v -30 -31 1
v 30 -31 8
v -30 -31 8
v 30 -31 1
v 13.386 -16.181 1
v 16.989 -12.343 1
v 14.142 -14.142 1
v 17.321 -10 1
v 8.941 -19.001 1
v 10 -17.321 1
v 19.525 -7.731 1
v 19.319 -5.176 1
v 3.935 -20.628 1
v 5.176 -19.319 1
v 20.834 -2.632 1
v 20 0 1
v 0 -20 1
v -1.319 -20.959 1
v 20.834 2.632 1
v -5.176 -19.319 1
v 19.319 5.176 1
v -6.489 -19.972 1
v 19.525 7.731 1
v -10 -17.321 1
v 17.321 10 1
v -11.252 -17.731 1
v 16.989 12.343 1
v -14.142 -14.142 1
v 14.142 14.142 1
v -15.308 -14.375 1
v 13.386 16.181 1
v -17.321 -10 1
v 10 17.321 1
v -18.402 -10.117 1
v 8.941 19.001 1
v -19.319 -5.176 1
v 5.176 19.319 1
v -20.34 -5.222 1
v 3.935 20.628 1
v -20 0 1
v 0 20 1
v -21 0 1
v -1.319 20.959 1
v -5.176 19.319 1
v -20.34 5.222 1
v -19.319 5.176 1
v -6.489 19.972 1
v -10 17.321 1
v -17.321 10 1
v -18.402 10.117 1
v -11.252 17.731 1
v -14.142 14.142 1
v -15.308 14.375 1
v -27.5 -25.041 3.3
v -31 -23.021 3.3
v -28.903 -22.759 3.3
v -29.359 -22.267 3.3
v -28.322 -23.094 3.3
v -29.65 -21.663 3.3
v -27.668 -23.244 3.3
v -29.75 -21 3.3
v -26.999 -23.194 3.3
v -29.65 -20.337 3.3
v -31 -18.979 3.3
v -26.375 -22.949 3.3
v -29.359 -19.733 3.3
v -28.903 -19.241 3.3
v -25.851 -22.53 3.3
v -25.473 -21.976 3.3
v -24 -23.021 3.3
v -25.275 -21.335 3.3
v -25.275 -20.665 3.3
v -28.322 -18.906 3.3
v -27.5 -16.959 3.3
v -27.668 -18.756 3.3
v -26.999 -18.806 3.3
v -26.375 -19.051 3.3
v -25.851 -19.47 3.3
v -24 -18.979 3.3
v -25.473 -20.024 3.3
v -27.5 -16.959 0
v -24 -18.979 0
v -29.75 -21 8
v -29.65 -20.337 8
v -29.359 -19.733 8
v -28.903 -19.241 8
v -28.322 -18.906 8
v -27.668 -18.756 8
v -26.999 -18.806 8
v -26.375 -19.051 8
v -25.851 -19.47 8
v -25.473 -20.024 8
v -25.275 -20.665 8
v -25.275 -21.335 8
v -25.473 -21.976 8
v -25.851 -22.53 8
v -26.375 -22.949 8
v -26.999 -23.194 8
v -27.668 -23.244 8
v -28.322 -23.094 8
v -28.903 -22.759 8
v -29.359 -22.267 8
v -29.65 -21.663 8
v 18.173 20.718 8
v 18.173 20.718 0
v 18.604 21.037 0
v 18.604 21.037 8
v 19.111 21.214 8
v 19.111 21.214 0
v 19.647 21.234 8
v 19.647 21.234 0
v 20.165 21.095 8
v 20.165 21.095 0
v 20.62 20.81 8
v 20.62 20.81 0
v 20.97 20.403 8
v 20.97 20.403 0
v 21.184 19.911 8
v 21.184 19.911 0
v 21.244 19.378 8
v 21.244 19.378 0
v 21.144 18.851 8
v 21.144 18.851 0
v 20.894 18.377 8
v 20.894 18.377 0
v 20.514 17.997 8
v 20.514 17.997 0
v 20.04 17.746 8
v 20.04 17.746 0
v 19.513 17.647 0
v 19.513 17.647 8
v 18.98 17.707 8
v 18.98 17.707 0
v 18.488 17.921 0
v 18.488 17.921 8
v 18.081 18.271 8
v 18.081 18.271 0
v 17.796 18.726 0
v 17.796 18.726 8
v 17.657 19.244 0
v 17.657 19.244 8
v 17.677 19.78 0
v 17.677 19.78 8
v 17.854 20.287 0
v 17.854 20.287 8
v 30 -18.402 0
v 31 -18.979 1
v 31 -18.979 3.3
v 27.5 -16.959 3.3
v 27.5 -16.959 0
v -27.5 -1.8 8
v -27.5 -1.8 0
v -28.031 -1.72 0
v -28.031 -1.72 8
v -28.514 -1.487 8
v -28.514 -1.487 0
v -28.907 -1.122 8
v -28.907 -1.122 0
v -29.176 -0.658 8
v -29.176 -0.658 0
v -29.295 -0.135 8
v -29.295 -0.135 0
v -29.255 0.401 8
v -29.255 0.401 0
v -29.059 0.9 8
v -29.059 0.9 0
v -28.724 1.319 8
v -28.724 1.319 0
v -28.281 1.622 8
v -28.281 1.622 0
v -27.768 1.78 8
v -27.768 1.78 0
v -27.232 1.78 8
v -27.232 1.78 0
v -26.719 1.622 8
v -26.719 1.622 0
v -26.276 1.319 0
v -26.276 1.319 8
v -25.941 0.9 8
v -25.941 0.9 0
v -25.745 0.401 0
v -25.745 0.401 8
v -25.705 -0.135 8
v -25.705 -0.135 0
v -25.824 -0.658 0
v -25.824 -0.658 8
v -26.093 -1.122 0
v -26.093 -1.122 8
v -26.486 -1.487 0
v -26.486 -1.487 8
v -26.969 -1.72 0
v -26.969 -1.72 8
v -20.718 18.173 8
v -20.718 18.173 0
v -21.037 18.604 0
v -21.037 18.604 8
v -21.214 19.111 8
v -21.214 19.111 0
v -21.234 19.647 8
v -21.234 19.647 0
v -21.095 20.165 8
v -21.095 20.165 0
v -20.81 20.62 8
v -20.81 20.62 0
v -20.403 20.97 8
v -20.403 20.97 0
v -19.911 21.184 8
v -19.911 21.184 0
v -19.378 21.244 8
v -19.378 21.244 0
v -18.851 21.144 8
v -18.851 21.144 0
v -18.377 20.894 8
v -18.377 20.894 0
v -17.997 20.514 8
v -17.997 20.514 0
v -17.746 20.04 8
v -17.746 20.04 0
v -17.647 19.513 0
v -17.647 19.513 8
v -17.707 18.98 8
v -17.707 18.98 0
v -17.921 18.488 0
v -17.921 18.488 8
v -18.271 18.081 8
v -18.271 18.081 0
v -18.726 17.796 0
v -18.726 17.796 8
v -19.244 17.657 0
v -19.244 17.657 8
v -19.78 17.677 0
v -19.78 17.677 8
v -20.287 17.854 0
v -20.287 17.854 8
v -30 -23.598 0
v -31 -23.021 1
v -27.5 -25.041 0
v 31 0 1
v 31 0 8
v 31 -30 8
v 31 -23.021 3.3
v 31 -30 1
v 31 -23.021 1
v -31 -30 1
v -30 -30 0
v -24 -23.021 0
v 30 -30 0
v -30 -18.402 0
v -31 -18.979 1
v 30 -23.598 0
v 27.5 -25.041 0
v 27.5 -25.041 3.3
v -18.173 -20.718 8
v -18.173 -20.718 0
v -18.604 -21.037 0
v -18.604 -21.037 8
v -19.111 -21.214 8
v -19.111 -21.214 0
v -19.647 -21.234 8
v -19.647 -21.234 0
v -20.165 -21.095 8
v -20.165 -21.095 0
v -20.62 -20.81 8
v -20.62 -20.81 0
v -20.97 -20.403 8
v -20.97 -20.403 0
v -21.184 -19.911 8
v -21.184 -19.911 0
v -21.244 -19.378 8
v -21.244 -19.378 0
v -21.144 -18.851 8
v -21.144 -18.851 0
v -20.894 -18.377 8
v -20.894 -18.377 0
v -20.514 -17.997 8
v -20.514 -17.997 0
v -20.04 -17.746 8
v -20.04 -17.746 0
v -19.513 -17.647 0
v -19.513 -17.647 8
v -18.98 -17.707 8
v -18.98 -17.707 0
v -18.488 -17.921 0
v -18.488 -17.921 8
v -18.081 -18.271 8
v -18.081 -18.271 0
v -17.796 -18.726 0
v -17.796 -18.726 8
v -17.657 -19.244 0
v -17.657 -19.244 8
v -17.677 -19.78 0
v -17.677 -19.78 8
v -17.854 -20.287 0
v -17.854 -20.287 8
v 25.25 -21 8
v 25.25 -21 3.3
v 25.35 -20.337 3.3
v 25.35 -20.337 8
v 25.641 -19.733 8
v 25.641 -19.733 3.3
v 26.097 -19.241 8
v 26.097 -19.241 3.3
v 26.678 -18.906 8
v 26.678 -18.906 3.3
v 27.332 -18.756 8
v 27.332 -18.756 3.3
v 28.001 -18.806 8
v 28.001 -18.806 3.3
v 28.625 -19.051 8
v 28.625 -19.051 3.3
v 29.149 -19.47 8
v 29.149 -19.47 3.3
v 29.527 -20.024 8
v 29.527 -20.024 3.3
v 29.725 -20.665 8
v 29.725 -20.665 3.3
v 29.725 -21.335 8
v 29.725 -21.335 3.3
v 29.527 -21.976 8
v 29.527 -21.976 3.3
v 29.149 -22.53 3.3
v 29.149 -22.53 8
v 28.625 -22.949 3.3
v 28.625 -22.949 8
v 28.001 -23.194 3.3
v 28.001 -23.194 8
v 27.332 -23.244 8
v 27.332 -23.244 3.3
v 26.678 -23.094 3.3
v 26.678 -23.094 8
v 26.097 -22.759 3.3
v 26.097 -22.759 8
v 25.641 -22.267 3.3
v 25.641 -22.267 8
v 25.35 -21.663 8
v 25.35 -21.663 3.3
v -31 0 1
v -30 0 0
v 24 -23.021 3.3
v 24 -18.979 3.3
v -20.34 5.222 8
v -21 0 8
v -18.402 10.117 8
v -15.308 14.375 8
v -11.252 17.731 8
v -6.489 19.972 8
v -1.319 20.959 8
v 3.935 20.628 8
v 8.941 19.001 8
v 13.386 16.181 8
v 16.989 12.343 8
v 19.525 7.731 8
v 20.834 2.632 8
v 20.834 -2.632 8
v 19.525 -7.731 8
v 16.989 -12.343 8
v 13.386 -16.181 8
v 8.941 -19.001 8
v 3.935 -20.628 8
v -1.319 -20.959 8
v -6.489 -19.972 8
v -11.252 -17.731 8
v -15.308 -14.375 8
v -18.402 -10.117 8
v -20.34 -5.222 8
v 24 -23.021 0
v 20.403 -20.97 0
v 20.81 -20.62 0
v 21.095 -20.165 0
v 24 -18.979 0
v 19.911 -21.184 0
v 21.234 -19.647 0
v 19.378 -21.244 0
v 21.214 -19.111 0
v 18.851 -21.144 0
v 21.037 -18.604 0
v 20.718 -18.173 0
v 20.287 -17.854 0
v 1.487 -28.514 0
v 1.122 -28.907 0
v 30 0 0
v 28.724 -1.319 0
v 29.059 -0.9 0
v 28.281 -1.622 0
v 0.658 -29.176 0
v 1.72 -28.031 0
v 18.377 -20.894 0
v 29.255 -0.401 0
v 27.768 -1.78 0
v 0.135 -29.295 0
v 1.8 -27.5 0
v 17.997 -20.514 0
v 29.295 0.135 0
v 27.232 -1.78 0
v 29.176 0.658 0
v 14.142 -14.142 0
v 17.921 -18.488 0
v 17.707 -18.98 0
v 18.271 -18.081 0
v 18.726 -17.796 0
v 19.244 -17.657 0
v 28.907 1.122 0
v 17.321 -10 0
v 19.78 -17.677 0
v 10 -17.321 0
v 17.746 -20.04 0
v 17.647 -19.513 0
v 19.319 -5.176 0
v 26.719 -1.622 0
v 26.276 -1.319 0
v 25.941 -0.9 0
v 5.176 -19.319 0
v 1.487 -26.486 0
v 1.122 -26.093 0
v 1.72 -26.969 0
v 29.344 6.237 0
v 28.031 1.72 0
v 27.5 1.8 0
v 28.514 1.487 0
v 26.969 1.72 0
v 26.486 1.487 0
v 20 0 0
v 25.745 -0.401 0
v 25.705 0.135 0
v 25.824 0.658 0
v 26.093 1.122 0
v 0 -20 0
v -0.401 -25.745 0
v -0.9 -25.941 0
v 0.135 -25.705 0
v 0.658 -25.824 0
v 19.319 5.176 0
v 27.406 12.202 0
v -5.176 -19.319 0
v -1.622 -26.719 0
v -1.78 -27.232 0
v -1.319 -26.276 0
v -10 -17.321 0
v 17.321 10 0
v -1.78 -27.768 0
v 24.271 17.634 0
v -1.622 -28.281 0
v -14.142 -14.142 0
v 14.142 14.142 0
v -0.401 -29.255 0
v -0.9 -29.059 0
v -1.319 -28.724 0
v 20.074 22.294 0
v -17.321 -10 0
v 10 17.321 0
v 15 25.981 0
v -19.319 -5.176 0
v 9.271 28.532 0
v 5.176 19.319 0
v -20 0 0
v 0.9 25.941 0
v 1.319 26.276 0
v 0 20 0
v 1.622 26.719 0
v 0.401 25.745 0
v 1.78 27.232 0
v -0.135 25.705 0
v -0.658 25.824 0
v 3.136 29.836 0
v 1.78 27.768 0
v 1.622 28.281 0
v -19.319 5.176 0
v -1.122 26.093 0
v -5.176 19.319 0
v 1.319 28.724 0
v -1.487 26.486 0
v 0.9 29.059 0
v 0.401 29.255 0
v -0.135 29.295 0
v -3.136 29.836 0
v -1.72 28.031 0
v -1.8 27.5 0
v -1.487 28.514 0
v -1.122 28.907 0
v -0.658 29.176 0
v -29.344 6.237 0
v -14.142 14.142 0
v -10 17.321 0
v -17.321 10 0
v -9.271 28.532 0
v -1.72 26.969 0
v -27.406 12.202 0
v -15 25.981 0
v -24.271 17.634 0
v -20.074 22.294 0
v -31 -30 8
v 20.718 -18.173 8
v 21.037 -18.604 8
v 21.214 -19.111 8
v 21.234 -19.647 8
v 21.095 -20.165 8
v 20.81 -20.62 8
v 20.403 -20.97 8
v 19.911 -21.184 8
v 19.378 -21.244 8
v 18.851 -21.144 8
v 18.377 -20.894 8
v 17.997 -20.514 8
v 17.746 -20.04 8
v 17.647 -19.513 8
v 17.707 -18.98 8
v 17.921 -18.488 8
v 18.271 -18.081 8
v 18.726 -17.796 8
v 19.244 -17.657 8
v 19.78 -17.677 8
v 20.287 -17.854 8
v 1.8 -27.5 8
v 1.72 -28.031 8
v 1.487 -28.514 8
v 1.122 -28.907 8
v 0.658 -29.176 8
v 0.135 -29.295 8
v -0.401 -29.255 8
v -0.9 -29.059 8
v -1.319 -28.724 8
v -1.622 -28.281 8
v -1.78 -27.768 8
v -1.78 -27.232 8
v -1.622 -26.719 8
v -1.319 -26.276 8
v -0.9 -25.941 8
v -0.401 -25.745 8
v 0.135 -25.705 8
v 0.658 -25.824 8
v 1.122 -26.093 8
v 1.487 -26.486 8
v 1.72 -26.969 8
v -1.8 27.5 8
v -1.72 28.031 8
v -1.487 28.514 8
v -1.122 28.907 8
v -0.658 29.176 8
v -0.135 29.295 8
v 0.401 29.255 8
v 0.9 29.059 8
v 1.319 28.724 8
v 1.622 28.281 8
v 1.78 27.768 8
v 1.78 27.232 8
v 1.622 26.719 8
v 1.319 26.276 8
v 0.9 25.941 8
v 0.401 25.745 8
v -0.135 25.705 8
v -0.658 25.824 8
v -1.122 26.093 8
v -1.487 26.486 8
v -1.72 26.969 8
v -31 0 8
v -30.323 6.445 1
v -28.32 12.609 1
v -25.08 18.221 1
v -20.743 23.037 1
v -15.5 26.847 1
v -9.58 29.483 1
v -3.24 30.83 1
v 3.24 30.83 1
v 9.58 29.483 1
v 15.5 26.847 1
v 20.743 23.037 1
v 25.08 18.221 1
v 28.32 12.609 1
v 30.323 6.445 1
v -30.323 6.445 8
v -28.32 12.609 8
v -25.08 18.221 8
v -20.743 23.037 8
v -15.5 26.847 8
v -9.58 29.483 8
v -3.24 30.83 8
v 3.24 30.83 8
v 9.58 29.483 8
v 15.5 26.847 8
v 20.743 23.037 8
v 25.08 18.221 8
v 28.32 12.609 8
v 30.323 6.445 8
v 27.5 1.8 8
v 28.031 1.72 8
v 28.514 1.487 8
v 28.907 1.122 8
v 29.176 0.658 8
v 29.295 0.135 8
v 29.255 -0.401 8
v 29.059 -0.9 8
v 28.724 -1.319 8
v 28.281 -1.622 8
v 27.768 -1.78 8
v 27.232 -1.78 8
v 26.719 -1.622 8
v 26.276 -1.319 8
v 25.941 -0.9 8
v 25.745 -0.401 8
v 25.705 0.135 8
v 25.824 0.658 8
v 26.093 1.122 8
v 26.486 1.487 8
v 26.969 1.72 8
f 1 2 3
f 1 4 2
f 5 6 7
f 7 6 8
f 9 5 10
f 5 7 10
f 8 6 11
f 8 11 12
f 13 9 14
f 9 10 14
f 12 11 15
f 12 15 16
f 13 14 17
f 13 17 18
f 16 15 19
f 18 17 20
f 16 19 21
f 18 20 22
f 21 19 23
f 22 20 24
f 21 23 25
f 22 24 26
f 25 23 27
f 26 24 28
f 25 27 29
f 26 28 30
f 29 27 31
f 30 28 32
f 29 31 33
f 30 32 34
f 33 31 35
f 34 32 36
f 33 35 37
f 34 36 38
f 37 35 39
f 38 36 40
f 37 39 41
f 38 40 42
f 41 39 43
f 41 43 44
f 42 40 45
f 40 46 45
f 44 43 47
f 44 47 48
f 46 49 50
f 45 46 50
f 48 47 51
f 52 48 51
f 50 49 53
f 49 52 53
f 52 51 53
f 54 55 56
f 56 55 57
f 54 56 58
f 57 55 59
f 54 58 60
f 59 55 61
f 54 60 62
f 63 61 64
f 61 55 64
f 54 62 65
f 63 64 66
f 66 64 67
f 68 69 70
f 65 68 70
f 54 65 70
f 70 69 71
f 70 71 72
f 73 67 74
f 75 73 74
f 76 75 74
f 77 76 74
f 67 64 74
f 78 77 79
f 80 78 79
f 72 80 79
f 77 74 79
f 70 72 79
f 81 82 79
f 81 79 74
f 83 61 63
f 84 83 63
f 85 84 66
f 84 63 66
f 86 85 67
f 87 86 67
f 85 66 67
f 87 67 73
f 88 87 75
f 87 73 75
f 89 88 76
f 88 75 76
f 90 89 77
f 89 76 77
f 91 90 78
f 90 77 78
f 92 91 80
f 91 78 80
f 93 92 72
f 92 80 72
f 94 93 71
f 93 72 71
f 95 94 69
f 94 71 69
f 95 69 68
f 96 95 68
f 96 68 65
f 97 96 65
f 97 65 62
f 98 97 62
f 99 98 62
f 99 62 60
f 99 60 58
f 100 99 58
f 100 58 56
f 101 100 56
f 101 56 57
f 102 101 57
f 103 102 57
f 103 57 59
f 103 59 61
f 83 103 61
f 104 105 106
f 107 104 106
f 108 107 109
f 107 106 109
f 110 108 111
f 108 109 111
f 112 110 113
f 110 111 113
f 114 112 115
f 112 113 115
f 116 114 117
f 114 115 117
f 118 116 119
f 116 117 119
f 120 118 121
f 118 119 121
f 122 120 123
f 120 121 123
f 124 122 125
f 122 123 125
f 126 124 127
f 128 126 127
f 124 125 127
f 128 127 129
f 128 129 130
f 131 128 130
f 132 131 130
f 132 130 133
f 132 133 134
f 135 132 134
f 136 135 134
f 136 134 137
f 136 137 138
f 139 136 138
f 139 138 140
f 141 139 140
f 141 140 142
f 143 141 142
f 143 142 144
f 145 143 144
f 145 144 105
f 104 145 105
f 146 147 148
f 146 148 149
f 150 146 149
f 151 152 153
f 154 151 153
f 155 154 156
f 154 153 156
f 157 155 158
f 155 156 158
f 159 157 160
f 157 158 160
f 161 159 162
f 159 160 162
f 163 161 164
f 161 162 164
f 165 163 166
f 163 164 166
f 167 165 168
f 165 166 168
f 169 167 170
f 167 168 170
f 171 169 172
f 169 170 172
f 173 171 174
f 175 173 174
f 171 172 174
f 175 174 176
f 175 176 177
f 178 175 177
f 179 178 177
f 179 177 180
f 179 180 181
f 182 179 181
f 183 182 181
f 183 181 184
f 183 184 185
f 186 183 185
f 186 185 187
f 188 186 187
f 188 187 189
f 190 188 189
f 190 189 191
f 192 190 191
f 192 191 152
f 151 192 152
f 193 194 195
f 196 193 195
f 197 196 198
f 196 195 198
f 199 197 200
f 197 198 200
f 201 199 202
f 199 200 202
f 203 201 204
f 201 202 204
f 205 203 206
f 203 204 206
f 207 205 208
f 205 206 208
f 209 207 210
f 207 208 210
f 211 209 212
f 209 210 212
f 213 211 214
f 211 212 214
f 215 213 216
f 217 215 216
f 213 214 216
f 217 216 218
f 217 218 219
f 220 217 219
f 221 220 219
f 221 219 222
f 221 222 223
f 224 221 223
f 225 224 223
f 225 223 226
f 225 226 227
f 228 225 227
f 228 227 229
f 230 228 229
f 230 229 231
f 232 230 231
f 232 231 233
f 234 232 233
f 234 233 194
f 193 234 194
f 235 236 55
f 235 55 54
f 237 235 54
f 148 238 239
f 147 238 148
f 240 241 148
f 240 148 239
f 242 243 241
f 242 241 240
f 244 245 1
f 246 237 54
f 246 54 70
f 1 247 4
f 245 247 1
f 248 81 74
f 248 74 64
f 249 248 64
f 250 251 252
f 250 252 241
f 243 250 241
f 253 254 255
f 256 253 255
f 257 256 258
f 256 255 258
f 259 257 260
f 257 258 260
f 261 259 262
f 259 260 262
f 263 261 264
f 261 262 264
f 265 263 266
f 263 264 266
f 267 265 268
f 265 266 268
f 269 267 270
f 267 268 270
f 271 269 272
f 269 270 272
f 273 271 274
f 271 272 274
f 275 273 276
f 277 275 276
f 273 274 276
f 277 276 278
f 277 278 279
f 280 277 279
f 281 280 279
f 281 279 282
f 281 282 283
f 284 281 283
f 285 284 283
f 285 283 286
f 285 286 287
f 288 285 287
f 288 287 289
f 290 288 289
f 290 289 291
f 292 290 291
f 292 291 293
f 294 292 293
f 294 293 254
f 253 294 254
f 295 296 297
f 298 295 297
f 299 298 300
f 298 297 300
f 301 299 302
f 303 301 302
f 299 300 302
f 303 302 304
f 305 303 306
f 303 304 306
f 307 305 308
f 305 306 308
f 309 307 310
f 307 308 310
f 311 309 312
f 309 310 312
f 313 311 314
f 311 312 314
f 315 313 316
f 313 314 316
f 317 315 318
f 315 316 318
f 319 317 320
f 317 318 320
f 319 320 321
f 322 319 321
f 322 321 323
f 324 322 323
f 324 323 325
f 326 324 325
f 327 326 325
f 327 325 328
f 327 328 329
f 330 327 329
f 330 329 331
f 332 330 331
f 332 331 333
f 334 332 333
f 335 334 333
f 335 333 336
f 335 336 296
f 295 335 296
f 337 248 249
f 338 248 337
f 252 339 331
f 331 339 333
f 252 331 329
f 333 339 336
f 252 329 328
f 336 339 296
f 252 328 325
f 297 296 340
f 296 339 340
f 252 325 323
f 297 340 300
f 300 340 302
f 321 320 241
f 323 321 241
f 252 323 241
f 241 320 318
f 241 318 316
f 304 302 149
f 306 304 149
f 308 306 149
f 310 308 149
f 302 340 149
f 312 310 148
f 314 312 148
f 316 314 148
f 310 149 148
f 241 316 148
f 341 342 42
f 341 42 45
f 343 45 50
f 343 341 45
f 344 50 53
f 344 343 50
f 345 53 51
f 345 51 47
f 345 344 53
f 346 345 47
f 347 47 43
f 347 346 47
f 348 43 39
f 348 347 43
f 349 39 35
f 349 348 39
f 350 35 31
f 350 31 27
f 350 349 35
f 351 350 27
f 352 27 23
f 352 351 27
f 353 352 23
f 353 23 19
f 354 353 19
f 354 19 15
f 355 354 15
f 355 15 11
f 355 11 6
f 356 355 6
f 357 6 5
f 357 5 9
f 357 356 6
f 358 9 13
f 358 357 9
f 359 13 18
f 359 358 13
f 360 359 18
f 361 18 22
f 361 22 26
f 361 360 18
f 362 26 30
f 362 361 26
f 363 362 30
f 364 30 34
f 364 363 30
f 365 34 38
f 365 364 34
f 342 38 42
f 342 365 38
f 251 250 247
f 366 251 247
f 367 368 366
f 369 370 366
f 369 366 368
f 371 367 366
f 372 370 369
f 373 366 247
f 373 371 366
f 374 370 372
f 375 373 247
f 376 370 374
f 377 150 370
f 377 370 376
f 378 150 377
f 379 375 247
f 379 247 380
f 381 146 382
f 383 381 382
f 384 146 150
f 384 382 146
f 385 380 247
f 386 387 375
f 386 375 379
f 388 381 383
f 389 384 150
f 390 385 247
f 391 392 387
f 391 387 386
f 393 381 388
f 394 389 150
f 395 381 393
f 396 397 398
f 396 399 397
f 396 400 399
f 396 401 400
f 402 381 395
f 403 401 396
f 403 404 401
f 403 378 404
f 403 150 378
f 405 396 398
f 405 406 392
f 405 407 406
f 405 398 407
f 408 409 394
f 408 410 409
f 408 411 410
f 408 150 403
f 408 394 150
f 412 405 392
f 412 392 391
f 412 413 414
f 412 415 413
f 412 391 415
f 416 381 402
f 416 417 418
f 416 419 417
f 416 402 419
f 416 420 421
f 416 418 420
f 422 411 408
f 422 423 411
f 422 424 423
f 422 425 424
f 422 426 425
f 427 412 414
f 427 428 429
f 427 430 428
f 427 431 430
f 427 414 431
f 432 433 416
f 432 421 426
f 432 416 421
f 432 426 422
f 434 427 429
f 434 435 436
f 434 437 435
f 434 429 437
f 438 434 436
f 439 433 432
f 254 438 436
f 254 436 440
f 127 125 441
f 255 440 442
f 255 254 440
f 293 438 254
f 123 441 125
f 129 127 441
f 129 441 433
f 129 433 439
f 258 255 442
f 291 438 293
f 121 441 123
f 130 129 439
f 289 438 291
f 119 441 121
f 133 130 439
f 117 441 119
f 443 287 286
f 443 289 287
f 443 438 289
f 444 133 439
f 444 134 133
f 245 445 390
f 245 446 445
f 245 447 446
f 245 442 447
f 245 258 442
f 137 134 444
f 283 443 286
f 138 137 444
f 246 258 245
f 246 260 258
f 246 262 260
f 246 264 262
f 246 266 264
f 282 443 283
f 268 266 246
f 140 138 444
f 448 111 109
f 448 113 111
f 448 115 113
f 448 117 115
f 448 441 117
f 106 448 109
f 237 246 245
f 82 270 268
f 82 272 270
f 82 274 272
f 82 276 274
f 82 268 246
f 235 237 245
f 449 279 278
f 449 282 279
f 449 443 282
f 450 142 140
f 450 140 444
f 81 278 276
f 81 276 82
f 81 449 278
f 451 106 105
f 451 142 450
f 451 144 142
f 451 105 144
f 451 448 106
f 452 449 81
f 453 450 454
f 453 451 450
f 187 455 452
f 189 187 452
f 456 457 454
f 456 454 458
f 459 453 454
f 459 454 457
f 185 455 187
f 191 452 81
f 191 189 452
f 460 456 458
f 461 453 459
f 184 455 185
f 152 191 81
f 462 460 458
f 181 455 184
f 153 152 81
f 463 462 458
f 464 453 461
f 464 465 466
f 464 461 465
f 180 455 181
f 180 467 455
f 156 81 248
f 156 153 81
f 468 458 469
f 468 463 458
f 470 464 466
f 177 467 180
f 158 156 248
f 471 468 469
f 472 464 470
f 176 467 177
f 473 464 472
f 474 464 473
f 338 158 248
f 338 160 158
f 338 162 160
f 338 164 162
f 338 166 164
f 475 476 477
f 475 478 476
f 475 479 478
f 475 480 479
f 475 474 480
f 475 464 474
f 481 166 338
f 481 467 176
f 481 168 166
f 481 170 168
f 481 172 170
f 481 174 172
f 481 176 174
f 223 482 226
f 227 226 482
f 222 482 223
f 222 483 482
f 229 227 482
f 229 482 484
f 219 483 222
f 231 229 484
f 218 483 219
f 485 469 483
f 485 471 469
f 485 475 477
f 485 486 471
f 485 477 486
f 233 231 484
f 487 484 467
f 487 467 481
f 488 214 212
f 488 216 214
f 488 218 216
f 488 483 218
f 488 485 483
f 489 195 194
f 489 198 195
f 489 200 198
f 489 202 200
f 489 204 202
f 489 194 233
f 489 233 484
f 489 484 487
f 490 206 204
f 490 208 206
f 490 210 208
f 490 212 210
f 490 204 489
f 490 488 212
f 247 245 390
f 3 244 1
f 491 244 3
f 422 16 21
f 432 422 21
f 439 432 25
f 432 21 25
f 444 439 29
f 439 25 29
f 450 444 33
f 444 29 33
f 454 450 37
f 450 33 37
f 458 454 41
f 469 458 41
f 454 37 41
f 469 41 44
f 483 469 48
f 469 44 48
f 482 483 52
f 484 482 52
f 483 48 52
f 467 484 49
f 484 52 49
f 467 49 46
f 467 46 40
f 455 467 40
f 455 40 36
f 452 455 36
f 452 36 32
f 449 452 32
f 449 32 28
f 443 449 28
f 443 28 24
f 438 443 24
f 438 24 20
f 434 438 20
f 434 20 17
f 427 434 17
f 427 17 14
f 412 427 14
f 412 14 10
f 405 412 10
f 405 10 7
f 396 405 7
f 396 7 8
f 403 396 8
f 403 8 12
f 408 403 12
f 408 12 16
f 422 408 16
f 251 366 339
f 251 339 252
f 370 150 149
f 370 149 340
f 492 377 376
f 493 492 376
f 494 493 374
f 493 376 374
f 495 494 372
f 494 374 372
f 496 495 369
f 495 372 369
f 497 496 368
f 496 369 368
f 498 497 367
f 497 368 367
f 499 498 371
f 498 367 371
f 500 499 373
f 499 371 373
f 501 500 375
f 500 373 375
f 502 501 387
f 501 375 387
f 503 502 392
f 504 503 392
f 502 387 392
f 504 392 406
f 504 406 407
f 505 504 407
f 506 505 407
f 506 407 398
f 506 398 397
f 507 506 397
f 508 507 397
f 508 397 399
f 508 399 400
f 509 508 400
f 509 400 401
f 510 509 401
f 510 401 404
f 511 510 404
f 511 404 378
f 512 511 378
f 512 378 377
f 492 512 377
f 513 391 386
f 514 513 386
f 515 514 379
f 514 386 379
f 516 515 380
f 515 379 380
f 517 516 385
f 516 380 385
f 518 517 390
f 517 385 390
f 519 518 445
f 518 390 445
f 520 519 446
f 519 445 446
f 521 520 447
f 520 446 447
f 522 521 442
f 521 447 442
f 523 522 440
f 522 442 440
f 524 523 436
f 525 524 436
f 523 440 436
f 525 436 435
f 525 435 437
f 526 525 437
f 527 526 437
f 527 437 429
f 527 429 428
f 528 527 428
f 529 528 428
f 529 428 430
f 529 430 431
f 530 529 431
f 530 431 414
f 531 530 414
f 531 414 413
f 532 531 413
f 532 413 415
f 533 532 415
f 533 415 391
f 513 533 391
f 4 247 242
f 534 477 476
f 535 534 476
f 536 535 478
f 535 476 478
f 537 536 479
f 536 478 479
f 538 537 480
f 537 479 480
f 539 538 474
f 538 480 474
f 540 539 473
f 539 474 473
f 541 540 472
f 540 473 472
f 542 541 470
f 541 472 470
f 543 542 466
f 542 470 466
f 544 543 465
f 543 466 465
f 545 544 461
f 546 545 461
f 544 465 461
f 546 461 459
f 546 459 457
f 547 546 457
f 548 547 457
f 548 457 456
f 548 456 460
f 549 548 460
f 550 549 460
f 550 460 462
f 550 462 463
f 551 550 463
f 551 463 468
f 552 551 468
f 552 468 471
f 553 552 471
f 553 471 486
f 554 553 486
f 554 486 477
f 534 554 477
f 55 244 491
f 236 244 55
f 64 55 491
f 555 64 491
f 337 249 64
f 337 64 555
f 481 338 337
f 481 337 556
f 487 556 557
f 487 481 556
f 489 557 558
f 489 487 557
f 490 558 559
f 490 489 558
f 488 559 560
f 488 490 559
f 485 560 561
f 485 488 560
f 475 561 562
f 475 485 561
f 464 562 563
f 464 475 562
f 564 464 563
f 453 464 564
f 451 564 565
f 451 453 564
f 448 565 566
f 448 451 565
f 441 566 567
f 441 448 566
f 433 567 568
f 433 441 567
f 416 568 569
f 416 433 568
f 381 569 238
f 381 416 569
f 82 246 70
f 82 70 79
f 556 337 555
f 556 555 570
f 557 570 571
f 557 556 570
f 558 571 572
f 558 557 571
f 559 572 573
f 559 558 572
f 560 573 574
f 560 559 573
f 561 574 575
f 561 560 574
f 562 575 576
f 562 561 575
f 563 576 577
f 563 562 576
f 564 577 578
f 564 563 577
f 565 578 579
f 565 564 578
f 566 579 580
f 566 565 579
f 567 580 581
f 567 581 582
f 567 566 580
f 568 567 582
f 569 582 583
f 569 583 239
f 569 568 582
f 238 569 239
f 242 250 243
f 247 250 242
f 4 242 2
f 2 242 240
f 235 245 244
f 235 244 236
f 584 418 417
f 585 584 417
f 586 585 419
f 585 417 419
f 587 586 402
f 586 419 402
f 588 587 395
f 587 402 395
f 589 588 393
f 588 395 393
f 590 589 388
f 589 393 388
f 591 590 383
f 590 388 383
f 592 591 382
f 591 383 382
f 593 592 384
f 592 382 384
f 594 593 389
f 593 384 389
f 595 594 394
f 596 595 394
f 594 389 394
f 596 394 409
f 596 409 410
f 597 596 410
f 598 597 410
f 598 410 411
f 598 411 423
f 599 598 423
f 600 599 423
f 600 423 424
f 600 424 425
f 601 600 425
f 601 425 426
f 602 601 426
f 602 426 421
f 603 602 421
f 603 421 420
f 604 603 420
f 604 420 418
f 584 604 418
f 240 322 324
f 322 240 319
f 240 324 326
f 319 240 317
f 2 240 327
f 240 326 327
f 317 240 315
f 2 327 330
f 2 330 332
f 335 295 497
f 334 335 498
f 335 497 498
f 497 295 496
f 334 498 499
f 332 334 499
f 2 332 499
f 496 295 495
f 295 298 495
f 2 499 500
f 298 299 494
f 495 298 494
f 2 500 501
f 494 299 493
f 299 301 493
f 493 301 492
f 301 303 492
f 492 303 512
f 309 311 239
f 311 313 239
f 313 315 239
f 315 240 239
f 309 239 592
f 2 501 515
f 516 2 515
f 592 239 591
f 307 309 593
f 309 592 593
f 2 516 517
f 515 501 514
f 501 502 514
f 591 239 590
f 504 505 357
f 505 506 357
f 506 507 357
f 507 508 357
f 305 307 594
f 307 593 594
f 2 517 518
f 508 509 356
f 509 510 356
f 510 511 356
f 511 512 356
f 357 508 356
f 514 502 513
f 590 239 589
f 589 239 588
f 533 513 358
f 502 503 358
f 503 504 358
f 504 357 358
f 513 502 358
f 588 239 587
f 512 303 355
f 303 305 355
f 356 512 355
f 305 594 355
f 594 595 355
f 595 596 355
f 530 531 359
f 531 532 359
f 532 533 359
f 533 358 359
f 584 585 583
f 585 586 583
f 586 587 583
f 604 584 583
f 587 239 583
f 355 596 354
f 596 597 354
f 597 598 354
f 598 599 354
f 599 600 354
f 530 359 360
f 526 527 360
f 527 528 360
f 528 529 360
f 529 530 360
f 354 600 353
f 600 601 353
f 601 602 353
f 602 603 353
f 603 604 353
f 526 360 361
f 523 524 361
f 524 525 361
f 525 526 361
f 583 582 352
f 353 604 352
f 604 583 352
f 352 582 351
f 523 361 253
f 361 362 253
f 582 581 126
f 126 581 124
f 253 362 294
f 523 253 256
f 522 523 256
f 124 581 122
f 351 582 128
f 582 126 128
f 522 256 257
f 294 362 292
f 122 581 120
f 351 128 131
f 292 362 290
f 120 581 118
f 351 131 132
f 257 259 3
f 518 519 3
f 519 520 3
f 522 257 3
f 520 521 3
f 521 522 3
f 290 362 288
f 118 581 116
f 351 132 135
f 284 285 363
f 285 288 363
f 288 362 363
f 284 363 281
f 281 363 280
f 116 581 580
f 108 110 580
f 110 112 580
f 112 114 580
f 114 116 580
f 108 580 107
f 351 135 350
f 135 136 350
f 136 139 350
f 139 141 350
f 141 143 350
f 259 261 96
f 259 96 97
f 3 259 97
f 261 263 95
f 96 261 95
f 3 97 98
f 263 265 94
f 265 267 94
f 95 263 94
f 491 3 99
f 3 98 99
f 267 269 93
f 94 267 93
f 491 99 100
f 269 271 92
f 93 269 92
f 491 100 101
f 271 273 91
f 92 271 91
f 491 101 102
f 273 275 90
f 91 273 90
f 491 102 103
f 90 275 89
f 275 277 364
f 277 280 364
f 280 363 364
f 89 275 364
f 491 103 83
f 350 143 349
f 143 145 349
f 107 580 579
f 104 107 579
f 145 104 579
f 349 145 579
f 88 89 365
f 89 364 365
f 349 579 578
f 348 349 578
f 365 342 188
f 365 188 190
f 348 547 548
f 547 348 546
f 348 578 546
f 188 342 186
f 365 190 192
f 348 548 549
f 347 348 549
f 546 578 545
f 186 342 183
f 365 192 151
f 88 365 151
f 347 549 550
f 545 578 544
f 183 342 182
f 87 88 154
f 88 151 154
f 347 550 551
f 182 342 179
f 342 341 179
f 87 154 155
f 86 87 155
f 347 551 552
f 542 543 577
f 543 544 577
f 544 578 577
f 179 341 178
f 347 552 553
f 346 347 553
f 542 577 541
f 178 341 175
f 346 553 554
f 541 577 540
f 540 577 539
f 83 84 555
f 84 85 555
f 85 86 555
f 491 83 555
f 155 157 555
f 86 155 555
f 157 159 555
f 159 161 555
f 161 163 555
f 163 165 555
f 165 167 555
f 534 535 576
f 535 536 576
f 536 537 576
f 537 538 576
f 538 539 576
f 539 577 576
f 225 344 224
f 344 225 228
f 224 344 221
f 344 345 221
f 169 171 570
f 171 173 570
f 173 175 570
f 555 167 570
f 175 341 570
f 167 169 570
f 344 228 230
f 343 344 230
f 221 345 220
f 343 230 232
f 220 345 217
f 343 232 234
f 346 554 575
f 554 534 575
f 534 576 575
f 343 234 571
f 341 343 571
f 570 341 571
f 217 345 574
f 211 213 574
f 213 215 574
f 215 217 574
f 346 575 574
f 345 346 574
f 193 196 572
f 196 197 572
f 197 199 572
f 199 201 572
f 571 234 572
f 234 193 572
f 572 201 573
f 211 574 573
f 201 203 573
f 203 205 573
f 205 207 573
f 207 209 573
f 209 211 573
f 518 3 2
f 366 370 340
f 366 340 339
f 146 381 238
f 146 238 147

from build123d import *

# Parameters (mm, degrees)
EXTRUDE_1_DEPTH          = 8
SKETCH_2_R               = 20
CUT_EXTRUDE_1_DEPTH      = 9
HOLE_WIZARD_M3_1_D       = 3.6
PATTERN_CIRCULAR_1_COUNT = 8
CHAMFER_1_SIZE           = 1
HOLE_WIZARD_M4_1_D       = 4.5
CUT_EXTRUDE_2_DEPTH      = 3.3
SKETCH_8_R               = 21
CUT_EXTRUDE_3_DEPTH      = 7


with BuildPart() as part:
    # ｽｹｯﾁ1 → ﾎﾞｽ - 押し出し1 (new body)
    with BuildSketch(Plane.XY):
        with BuildLine():
            Line((31, -31), (-31, -31))
            Line((-31, -31), (-31, 0))
            ThreePointArc((-31, 0), (0, 31), (31, 0))
            Line((31, 0), (31, -31))
        make_face()
    extrude(amount=EXTRUDE_1_DEPTH)

    # ｽｹｯﾁ2 → ｶｯﾄ - 押し出し1 (cut, through all)
    with BuildSketch(Plane.XY.offset(8)):
        Circle(SKETCH_2_R)
    extrude(amount=-CUT_EXTRUDE_1_DEPTH, mode=Mode.SUBTRACT)

    # M3 すきま穴1 (through all)
    with Locations(Plane.XY.offset(8)):
        with Locations((0, 27.5)):
            hole_wizard_m3_1 = Hole(HOLE_WIZARD_M3_1_D / 2)

    # 円形ﾊﾟﾀｰﾝ1: M3 すきま穴1 ×8 about axis
    pattern_circular_1_axis = Axis((0, 0, 0), (0, 0, 1))
    for i in range(1, PATTERN_CIRCULAR_1_COUNT):
        add(hole_wizard_m3_1.rotate(pattern_circular_1_axis, i * 360 / PATTERN_CIRCULAR_1_COUNT), mode=Mode.SUBTRACT)

    # 面取り1
    chamfer_1_edges = [part.edges().sort_by_distance(p)[0] for p in [
        (31, -15.5, 0),
        (0, -31, 0),
        (-31, -15.5, 0),
        (0, 31, 0),
        (31, -31, 4),
        (-31, -31, 4),
    ]]
    chamfer(chamfer_1_edges, length=CHAMFER_1_SIZE)

    # M4 すきま穴1 (through all)
    with Locations(Plane.XY.offset(8)):
        with Locations((-27.5, -21), (27.5, -21)):
            Hole(HOLE_WIZARD_M4_1_D / 2)

    # ｽｹｯﾁ7 → ｶｯﾄ - 押し出し2 (cut)
    with BuildSketch(Plane.XY):
        Polygon((-27.5, -25.041451884), (-24, -23.020725942), (-24, -18.979274058), (-27.5, -16.958548116), (-31, -18.979274058), (-31, -23.020725942), align=None)
        Polygon((31, -18.979274058), (27.5, -16.958548116), (24, -18.979274058), (24, -23.020725942), (27.5, -25.041451884), (31, -23.020725942), align=None)
    extrude(amount=CUT_EXTRUDE_2_DEPTH, mode=Mode.SUBTRACT)

    # ｽｹｯﾁ8 → ｶｯﾄ - 押し出し3 (cut)
    with BuildSketch(Plane(origin=(0, 0, 8), x_dir=(-1, 0, 0), z_dir=(0, 0, -1))):
        Circle(SKETCH_8_R)
    extrude(amount=CUT_EXTRUDE_3_DEPTH, mode=Mode.SUBTRACT)


solid = part.part
